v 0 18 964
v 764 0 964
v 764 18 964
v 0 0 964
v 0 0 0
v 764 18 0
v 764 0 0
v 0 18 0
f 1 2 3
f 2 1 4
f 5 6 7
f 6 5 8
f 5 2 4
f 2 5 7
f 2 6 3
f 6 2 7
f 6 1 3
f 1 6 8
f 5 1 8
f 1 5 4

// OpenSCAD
// file: ../config/TF3D-SDC-01_dimensions.scad
// Modelo fijo TF3D-SDC-01 — unidades en mm
CABINET_W = 800;
CABINET_H = 1000;
CABINET_D = 500;
BOARD_T = 18;
INNER_W = CABINET_W - 2*BOARD_T;
INNER_H = CABINET_H - 2*BOARD_T;
BACK_W = INNER_W;
BACK_H = INNER_H;
BACK_T = BOARD_T;
SHELF_W = INNER_W;
SHELF_D = 450;
SHELF_T = BOARD_T;
TECH_H = 160;
SHELF_Z_1 = 250;
SHELF_Z_2 = 480;
SHELF_Z_3 = 710;
MELAMINE = [0.94,0.94,0.94];
ACRYLIC = [0.65,0.85,1.00,0.30];
METAL = [0.10,0.10,0.10];
// file: ../config/common.scad
include <TF3D-SDC-01_dimensions.scad>
module board(size=[100,100,18], board_color=MELAMINE){ color(board_color) cube(size); }
// main file
include <../config/common.scad>
board([BACK_W,BACK_T,BACK_H]);
